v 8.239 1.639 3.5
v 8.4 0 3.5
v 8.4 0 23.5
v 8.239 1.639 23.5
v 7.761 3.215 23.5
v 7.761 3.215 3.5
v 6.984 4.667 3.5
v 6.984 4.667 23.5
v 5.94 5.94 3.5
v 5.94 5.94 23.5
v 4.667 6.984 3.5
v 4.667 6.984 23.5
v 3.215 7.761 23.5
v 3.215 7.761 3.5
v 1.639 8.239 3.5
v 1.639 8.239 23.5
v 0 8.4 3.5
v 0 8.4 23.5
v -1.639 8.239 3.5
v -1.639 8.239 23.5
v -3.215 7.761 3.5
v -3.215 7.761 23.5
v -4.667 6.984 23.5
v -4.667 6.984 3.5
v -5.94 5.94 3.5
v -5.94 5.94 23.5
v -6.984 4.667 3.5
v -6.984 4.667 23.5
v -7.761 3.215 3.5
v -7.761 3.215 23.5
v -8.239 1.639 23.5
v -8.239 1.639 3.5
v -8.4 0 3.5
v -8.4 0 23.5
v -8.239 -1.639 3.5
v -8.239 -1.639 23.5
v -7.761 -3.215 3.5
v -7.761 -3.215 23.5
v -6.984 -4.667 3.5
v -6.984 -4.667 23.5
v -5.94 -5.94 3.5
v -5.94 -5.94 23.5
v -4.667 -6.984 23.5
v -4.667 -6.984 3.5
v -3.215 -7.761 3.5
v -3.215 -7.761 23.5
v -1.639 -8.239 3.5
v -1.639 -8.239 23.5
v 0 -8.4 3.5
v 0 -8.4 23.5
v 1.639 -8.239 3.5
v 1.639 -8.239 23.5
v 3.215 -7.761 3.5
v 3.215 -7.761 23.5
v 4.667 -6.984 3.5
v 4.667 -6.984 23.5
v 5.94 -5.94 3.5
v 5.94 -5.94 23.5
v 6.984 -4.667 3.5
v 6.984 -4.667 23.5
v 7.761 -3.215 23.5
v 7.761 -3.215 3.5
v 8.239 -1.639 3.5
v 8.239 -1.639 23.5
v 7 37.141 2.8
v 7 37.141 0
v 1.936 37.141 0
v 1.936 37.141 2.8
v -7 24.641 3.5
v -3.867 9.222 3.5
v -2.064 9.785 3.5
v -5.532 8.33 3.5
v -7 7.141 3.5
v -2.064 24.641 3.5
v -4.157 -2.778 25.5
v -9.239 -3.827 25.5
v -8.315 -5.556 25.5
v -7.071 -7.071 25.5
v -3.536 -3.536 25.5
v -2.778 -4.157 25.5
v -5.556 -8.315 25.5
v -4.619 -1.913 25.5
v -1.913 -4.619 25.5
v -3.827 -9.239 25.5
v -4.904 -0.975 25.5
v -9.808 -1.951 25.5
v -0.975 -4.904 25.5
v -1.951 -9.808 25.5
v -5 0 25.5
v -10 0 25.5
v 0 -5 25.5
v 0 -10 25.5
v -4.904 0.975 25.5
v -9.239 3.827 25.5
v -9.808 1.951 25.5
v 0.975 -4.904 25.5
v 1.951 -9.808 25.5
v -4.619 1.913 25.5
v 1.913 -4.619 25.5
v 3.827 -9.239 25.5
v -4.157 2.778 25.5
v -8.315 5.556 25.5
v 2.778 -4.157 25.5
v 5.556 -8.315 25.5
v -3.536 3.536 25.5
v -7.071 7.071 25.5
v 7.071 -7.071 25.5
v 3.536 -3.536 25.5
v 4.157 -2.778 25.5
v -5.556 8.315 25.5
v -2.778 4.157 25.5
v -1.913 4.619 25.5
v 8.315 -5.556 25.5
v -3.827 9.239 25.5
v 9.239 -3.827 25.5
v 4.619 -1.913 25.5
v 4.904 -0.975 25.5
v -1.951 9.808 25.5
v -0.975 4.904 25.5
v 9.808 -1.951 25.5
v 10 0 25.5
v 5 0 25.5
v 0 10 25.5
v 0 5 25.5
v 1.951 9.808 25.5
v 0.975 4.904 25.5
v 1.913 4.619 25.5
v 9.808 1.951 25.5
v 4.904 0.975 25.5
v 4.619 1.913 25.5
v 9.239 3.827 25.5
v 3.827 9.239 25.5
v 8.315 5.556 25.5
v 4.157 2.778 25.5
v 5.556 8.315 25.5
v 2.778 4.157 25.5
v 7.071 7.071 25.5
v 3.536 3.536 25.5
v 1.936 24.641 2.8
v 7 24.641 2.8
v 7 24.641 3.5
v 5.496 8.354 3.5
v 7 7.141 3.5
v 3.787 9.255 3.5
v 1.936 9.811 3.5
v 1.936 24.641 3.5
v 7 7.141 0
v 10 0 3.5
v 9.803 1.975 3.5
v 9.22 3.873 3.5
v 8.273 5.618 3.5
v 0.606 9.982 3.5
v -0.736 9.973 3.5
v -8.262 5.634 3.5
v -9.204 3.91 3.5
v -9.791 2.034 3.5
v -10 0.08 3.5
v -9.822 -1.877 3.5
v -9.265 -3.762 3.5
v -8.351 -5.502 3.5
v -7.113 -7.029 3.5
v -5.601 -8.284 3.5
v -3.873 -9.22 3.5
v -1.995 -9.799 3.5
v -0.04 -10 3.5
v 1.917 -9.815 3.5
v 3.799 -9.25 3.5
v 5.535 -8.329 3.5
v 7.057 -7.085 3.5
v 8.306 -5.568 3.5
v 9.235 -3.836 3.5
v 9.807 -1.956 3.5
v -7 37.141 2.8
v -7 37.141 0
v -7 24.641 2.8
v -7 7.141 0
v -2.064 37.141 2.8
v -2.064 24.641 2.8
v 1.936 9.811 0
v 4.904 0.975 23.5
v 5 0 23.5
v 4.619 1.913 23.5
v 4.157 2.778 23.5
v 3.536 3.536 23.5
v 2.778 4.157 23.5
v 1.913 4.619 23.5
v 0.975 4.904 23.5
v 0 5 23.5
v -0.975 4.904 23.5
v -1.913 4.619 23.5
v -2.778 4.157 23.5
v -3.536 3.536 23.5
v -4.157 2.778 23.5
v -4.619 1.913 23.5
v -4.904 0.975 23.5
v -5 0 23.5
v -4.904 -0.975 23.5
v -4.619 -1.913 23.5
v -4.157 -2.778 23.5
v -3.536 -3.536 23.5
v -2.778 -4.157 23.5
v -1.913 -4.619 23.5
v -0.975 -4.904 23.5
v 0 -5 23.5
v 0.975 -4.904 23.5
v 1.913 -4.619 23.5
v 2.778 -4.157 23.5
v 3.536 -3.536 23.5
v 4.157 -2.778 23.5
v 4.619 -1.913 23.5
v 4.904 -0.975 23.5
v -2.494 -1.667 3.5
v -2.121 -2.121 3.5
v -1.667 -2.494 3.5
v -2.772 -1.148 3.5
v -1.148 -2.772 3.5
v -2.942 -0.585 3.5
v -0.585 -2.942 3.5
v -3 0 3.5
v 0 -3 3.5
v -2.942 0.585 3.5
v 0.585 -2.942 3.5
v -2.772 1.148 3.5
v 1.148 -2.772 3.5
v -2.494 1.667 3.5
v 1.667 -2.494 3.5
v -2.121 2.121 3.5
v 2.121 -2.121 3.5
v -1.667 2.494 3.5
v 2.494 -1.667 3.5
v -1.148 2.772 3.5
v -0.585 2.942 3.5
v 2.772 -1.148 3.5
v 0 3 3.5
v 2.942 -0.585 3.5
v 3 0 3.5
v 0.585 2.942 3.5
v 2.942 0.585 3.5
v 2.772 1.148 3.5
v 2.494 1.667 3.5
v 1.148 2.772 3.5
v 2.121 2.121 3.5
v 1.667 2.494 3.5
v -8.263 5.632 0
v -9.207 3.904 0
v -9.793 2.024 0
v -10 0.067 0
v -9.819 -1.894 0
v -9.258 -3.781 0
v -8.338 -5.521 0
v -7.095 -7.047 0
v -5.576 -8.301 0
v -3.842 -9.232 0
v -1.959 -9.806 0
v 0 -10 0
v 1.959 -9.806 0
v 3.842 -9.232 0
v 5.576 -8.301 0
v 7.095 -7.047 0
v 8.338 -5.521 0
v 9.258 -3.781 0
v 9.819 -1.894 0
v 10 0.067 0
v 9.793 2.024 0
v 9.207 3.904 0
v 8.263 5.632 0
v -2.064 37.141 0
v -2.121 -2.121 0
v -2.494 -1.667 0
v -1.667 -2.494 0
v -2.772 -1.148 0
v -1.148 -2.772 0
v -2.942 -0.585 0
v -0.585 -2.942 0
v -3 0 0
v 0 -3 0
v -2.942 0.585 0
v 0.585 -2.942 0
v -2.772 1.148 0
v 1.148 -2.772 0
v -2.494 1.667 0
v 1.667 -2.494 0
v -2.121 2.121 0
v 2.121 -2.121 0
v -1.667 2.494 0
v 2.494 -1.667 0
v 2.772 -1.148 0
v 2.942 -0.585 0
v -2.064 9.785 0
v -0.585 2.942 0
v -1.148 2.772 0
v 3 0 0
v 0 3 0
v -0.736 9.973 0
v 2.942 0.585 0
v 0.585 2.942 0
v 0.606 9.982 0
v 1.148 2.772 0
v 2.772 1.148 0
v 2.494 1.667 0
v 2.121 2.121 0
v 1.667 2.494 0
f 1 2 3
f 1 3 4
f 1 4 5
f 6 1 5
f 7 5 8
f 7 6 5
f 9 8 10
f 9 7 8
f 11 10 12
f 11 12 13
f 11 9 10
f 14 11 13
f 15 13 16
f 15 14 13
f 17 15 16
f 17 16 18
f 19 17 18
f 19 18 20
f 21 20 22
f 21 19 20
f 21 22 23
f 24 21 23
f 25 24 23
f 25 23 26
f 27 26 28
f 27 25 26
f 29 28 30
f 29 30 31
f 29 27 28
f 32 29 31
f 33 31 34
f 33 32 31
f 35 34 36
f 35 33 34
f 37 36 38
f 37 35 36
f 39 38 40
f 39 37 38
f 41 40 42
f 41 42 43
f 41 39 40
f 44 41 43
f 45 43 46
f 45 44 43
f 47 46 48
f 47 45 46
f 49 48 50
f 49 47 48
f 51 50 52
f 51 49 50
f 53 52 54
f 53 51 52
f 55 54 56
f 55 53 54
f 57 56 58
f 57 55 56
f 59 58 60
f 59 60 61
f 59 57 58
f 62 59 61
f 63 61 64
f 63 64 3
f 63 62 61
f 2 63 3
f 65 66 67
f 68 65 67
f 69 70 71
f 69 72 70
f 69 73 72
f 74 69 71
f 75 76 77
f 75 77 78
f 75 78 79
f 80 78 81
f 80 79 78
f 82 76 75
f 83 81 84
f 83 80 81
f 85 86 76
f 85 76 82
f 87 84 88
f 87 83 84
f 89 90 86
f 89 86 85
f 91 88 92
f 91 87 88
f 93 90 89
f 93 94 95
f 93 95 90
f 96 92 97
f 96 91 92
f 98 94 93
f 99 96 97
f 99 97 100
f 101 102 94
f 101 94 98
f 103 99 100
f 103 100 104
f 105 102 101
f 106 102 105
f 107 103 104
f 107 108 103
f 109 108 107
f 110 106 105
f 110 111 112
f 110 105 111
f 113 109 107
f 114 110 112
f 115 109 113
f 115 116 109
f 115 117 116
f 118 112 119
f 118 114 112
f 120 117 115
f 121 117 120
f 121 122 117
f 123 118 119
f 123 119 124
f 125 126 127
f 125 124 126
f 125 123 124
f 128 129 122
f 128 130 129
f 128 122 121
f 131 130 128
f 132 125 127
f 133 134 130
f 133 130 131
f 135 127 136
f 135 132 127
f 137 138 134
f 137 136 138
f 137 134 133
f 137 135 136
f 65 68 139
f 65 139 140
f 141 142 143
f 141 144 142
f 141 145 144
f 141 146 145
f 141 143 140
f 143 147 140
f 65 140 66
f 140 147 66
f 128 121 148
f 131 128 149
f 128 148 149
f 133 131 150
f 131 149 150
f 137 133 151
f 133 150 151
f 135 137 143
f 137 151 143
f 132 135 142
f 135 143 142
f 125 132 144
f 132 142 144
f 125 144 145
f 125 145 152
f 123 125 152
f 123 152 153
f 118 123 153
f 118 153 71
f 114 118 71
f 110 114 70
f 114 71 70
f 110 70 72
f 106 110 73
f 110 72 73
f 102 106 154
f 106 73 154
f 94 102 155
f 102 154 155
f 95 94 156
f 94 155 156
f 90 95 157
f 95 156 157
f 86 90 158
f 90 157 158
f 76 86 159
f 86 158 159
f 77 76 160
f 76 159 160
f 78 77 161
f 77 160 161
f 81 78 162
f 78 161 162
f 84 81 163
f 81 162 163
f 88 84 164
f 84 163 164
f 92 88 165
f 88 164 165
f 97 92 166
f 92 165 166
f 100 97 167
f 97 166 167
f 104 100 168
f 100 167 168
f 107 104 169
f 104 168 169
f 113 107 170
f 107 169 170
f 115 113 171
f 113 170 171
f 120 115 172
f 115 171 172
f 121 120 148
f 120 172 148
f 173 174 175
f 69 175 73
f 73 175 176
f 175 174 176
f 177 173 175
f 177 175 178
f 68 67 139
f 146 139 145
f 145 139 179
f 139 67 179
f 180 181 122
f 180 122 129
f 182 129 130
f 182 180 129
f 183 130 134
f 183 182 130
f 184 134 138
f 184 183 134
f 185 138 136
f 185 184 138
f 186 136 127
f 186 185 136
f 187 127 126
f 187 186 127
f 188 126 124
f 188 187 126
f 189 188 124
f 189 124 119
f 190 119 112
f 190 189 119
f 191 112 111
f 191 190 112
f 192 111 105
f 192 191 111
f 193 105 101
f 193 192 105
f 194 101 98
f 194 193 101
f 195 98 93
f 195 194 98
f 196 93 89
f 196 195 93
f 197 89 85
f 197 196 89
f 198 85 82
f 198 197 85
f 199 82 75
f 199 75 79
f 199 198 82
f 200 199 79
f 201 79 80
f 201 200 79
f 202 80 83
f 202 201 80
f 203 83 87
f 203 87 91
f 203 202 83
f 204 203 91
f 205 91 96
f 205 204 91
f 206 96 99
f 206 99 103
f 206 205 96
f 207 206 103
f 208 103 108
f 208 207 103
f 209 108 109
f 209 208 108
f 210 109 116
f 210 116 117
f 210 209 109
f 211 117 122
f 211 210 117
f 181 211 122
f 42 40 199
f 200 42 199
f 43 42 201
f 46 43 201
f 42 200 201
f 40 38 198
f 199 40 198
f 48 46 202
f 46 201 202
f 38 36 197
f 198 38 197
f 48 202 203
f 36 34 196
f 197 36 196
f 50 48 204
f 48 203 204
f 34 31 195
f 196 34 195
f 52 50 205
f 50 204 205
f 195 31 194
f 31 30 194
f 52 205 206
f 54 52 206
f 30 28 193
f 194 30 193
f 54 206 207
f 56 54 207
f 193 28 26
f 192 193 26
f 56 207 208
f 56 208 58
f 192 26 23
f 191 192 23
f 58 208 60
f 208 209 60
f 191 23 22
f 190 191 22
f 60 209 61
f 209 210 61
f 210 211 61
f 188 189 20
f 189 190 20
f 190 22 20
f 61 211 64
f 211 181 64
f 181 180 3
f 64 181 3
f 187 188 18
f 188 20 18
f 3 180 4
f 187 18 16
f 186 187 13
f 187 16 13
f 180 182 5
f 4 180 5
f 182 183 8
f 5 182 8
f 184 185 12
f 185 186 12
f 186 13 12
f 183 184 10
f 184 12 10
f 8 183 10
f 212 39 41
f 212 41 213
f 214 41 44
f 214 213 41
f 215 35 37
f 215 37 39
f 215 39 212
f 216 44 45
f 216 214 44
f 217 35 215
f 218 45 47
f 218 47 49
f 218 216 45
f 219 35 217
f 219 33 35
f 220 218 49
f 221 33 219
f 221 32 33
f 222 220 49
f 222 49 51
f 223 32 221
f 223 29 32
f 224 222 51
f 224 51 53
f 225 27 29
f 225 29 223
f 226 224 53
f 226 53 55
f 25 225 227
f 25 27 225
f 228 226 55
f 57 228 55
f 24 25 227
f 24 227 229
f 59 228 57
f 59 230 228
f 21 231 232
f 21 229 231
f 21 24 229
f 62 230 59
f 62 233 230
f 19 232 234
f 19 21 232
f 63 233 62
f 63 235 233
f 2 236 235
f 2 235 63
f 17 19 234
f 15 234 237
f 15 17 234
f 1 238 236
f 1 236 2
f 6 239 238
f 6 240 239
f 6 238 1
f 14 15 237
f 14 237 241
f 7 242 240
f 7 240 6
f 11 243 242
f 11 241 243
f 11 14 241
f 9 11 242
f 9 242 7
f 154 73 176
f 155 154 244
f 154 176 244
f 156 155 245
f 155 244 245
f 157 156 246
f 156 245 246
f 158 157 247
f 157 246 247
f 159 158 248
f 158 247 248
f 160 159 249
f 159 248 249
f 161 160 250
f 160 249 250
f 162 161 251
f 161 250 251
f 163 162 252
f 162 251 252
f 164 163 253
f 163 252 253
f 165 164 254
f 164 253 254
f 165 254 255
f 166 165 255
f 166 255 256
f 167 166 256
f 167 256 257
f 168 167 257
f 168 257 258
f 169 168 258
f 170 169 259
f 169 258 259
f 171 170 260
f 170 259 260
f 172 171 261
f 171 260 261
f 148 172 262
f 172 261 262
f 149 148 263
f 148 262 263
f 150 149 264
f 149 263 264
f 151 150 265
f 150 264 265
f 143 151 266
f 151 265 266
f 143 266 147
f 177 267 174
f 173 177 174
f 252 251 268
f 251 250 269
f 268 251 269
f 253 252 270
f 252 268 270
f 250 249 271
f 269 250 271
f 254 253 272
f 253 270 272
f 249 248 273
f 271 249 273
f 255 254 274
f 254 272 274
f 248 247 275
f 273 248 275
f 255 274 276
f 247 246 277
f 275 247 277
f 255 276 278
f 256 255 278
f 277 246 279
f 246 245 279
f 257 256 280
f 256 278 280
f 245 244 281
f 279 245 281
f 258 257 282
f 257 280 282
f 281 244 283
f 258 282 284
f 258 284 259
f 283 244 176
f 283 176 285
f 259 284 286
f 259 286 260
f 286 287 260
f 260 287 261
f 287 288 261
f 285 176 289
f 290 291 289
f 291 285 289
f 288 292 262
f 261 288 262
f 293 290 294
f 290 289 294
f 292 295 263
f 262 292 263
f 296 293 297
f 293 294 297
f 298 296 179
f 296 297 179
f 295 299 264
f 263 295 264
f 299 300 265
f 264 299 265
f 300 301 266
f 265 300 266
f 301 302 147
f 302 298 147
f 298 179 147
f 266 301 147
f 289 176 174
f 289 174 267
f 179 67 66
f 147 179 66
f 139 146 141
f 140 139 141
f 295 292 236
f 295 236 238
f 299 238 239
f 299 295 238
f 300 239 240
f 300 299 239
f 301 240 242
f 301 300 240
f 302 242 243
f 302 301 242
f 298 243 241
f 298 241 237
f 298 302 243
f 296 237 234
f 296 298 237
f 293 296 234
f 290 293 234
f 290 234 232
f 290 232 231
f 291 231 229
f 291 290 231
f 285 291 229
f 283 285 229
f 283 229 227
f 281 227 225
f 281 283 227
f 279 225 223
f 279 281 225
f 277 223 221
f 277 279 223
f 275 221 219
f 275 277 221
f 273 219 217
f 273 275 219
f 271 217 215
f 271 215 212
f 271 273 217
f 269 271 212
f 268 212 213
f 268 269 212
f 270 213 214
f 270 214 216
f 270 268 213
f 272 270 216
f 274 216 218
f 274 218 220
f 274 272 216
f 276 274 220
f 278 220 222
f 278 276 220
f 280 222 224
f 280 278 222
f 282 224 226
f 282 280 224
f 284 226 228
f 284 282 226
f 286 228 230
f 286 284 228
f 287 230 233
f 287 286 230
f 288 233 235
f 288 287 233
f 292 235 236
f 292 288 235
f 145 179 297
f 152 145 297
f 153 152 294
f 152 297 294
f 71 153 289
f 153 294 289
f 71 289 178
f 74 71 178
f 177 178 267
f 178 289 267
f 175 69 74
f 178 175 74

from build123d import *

# Parameters (mm, degrees)
F0_R     = 3
F1_DEPTH = 3.5
F2_W     = 14
F2_H     = 12.5
F3_DEPTH = 0.7
F4_R     = 10
F4_R_2   = 8.4
F5_DEPTH = 20
F6_R     = 10
F6_R_2   = 5
F7_DEPTH = 2


with BuildPart() as f1:
    # F0 (on Top) → F1 (new body)
    with BuildSketch(Plane.XY):
        with BuildLine():
            Line((-7, 37.141428), (-7, 7.141428))
            ThreePointArc((-7, 7.141428), (0, -10), (7, 7.141428))
            Line((7, 7.141428), (7, 37.141428))
            Line((7, 37.141428), (1.936133, 37.141428))
            Line((1.936133, 37.141428), (1.936133, 9.810779))
            ThreePointArc((1.936133, 9.810779), (-0.065184, 9.999788), (-2.063867, 9.784705))
            Line((-2.063867, 9.784705), (-2.063867, 37.141428))
            Line((-2.063867, 37.141428), (-7, 37.141428))
        make_face()
        Circle(F0_R, mode=Mode.SUBTRACT)
    extrude(amount=F1_DEPTH)

    # F2 (on face) → F3 (cut)
    with BuildSketch(Plane.XY.offset(3.5)):
        with Locations((0, 30.891428)):
            Rectangle(F2_W, F2_H)
    extrude(amount=-F3_DEPTH, mode=Mode.SUBTRACT)

    # F4 (on face) → F5 (join)
    with BuildSketch(Plane.XY.offset(3.5)):
        Circle(F4_R)
        Circle(F4_R_2, mode=Mode.SUBTRACT)
    extrude(amount=F5_DEPTH)

    # F6 (on face) → F7 (join)
    with BuildSketch(Plane.XY.offset(23.5)):
        Circle(F6_R)
        Circle(F6_R_2, mode=Mode.SUBTRACT)
    extrude(amount=F7_DEPTH)


solid = f1.part
